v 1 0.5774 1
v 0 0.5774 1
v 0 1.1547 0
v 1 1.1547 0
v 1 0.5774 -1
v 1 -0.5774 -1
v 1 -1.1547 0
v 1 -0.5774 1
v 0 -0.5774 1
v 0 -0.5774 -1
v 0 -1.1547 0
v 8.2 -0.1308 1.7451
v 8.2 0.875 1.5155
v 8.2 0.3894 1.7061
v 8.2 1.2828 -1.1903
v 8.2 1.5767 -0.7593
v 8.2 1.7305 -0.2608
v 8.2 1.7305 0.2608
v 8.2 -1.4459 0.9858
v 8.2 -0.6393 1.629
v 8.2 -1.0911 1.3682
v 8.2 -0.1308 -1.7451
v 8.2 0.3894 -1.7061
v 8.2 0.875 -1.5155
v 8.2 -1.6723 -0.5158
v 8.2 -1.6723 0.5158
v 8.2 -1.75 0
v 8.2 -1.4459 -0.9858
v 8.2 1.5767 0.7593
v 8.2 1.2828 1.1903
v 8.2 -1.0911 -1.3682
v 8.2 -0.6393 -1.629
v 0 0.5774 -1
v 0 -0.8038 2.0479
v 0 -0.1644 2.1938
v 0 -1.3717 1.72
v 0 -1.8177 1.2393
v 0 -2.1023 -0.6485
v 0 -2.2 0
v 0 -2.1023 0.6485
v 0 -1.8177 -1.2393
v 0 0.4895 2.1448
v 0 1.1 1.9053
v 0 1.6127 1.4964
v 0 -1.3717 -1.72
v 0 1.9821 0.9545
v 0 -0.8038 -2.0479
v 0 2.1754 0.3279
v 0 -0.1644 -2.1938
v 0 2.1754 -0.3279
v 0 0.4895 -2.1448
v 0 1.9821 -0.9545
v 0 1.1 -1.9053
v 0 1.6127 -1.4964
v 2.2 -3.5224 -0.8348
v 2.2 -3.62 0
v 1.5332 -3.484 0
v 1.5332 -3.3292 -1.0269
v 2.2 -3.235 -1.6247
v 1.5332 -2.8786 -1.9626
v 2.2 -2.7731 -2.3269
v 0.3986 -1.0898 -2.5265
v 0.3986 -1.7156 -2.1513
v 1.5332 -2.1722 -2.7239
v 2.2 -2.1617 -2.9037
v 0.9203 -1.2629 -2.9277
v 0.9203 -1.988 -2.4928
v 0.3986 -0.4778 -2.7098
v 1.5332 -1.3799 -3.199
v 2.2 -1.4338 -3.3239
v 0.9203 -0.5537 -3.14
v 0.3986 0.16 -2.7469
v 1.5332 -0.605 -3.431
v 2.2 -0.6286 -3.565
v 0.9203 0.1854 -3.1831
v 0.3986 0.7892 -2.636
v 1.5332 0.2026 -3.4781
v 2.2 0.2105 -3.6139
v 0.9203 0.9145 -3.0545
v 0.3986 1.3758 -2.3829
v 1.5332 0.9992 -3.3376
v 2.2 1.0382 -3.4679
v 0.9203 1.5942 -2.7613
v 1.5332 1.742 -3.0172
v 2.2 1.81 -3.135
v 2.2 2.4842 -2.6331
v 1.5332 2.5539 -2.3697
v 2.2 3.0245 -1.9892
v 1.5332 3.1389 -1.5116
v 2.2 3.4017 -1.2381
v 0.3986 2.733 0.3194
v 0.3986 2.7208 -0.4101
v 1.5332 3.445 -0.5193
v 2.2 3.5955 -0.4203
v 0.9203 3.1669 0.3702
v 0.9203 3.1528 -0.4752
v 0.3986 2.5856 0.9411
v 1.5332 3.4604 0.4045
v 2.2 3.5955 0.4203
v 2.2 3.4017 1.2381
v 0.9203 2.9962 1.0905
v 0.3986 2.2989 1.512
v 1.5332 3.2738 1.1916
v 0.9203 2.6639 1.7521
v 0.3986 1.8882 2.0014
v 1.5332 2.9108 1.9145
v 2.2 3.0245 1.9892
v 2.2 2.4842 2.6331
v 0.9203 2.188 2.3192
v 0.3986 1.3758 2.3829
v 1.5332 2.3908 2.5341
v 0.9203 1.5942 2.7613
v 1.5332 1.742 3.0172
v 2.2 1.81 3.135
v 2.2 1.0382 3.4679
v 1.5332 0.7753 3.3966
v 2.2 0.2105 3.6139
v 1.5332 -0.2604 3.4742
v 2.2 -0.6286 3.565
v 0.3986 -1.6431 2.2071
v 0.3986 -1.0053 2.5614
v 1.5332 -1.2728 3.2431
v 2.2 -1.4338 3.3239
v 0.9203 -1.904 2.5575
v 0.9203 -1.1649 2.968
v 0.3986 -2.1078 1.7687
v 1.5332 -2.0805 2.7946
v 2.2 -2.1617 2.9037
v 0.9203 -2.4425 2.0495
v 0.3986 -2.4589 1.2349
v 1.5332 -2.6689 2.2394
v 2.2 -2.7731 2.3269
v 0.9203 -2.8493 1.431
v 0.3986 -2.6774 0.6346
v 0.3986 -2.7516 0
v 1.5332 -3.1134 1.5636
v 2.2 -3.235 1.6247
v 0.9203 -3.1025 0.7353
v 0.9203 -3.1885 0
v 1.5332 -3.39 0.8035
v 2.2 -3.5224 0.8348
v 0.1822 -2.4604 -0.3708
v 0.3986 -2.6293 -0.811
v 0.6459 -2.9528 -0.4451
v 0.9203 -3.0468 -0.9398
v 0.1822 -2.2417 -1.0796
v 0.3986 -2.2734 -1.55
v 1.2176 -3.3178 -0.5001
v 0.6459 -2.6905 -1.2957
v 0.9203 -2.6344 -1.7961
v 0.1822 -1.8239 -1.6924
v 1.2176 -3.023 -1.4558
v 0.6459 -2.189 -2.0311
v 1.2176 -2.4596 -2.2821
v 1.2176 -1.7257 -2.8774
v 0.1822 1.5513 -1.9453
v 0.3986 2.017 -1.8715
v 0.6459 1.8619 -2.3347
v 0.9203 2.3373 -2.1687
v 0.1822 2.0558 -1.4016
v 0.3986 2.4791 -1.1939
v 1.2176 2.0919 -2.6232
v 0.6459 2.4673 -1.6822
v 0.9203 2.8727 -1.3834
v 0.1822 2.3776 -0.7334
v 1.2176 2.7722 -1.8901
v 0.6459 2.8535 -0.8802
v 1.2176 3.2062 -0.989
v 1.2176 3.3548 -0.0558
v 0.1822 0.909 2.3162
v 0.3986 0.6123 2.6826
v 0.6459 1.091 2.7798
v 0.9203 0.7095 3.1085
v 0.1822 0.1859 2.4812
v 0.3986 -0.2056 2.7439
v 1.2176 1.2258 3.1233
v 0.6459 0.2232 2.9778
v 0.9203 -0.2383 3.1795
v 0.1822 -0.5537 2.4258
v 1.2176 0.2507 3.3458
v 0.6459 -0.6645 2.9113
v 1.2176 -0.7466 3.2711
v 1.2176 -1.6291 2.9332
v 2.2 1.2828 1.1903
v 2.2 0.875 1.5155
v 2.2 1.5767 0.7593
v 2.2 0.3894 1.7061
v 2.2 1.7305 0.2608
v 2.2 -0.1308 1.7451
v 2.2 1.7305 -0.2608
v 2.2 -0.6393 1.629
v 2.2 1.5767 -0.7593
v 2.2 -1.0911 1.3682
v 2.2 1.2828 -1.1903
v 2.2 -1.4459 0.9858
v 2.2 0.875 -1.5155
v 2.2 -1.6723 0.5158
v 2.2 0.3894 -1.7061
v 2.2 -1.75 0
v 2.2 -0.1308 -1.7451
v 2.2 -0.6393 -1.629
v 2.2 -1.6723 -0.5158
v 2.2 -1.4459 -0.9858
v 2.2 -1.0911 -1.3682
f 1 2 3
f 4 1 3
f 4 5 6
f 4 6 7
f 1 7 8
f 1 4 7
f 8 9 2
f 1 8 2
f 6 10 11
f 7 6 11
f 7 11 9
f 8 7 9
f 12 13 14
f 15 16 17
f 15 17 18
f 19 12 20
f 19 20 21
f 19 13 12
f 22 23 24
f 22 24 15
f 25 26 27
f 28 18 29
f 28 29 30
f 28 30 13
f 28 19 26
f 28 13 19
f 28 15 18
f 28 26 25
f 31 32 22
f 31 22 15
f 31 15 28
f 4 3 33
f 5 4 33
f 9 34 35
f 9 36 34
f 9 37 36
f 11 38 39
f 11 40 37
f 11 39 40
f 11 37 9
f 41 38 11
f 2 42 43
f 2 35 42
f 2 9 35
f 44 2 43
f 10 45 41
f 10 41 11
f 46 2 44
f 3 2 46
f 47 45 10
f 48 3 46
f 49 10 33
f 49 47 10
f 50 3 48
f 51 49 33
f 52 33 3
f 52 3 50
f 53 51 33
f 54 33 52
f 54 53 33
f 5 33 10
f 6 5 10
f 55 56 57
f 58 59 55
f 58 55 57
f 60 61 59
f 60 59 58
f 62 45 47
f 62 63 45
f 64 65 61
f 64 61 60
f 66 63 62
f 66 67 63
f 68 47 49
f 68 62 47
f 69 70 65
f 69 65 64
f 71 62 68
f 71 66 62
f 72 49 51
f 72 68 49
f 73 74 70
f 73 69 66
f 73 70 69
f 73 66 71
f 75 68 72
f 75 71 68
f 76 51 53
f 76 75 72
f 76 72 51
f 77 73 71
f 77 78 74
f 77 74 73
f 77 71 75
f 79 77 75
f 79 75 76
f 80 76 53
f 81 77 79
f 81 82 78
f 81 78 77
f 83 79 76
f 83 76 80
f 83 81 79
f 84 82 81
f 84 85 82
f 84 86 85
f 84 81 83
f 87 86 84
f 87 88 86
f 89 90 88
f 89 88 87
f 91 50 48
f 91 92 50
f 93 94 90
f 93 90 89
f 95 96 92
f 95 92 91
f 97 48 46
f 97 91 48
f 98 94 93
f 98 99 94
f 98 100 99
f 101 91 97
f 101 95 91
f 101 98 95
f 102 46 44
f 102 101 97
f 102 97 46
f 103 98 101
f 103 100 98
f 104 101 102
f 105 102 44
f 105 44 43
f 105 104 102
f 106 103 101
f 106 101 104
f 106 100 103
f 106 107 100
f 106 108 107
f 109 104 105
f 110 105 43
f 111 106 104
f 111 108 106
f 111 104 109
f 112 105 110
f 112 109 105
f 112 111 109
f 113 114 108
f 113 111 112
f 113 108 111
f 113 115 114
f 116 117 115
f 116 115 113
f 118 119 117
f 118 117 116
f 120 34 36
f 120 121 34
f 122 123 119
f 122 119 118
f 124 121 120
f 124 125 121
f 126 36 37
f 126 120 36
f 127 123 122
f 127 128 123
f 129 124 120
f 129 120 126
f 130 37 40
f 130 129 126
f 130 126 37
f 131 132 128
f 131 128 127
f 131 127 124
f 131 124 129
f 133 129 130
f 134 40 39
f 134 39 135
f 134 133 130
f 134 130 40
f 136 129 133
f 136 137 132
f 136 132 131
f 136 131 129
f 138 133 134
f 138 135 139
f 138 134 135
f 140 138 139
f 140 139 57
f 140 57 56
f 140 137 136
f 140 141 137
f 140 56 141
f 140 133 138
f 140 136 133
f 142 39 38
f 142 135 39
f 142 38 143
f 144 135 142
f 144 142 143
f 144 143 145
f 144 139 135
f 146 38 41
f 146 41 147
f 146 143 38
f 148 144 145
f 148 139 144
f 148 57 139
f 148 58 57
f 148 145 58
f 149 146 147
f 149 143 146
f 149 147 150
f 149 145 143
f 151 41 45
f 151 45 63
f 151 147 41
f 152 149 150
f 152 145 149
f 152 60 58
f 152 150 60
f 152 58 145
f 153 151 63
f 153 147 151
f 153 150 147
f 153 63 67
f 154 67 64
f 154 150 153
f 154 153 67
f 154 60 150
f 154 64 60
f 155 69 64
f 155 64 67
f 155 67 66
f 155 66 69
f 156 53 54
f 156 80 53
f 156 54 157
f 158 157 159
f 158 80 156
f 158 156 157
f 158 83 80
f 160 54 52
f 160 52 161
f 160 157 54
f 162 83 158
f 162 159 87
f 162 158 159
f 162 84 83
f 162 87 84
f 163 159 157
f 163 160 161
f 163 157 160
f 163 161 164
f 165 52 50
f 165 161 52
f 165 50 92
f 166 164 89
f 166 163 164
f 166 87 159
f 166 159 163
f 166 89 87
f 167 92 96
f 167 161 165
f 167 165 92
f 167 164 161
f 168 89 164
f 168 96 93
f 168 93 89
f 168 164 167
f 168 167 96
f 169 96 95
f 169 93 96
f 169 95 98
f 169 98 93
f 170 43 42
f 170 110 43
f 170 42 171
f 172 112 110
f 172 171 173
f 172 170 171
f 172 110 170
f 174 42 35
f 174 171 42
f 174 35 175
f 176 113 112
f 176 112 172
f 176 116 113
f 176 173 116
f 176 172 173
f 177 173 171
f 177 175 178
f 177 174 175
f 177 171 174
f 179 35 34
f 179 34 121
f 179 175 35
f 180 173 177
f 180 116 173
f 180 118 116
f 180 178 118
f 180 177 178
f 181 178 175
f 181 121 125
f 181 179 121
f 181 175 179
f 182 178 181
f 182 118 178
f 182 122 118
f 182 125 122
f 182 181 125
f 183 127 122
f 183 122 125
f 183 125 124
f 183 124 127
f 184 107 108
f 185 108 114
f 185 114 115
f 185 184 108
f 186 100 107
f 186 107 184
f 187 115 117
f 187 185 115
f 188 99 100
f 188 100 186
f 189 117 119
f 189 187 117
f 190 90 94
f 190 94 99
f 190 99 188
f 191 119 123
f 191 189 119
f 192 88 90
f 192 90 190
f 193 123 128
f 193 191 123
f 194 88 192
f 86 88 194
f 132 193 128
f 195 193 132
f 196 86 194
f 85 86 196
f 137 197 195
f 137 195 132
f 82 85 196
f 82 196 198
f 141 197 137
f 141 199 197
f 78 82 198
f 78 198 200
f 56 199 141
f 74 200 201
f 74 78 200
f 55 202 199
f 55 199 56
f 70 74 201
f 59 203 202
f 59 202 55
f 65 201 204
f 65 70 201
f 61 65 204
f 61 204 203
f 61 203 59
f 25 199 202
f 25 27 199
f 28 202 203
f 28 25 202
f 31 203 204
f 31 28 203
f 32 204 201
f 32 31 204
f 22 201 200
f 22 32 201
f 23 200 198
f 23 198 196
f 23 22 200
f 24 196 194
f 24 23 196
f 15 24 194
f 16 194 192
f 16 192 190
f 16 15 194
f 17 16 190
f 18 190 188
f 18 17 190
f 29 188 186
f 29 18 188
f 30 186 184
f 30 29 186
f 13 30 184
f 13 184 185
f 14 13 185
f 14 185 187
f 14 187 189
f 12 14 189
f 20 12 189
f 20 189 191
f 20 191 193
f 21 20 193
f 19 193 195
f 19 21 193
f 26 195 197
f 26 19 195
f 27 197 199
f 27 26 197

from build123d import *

# Parameters (mm, degrees)
CUT_EXTRUDE_1_DEPTH = 1


with BuildPart() as part:
    # 草图1 → 旋转1 (revolve)
    with BuildSketch(Plane.XY, mode=Mode.PRIVATE) as revolve_1_sk:
        with BuildLine():
            Line((0, 0), (0, 2.2))
            ThreePointArc((0, 2.2), (0.920270994, 3.188453389), (2.2, 3.62))
            Line((2.2, 3.62), (2.2, 1.75))
            Line((2.2, 1.75), (8.2, 1.75))
            Line((8.2, 1.75), (8.2, 0))
            Line((8.2, 0), (0, 0))
        make_face()
    revolve(revolve_1_sk.sketch.rotate(Axis((0, 0, 0), (1, 0, 0)), 180), axis=Axis((0, 0, 0), (1, 0, 0)))

    # 草图2 → 切除-拉伸1 (cut)
    with BuildSketch(Plane.ZY):
        Polygon((0, 1.154700538), (-1, 0.577350269), (-1, -0.577350269), (0, -1.154700538), (1, -0.577350269), (1, 0.577350269), align=None)
    extrude(amount=-CUT_EXTRUDE_1_DEPTH, mode=Mode.SUBTRACT)


solid = part.part
